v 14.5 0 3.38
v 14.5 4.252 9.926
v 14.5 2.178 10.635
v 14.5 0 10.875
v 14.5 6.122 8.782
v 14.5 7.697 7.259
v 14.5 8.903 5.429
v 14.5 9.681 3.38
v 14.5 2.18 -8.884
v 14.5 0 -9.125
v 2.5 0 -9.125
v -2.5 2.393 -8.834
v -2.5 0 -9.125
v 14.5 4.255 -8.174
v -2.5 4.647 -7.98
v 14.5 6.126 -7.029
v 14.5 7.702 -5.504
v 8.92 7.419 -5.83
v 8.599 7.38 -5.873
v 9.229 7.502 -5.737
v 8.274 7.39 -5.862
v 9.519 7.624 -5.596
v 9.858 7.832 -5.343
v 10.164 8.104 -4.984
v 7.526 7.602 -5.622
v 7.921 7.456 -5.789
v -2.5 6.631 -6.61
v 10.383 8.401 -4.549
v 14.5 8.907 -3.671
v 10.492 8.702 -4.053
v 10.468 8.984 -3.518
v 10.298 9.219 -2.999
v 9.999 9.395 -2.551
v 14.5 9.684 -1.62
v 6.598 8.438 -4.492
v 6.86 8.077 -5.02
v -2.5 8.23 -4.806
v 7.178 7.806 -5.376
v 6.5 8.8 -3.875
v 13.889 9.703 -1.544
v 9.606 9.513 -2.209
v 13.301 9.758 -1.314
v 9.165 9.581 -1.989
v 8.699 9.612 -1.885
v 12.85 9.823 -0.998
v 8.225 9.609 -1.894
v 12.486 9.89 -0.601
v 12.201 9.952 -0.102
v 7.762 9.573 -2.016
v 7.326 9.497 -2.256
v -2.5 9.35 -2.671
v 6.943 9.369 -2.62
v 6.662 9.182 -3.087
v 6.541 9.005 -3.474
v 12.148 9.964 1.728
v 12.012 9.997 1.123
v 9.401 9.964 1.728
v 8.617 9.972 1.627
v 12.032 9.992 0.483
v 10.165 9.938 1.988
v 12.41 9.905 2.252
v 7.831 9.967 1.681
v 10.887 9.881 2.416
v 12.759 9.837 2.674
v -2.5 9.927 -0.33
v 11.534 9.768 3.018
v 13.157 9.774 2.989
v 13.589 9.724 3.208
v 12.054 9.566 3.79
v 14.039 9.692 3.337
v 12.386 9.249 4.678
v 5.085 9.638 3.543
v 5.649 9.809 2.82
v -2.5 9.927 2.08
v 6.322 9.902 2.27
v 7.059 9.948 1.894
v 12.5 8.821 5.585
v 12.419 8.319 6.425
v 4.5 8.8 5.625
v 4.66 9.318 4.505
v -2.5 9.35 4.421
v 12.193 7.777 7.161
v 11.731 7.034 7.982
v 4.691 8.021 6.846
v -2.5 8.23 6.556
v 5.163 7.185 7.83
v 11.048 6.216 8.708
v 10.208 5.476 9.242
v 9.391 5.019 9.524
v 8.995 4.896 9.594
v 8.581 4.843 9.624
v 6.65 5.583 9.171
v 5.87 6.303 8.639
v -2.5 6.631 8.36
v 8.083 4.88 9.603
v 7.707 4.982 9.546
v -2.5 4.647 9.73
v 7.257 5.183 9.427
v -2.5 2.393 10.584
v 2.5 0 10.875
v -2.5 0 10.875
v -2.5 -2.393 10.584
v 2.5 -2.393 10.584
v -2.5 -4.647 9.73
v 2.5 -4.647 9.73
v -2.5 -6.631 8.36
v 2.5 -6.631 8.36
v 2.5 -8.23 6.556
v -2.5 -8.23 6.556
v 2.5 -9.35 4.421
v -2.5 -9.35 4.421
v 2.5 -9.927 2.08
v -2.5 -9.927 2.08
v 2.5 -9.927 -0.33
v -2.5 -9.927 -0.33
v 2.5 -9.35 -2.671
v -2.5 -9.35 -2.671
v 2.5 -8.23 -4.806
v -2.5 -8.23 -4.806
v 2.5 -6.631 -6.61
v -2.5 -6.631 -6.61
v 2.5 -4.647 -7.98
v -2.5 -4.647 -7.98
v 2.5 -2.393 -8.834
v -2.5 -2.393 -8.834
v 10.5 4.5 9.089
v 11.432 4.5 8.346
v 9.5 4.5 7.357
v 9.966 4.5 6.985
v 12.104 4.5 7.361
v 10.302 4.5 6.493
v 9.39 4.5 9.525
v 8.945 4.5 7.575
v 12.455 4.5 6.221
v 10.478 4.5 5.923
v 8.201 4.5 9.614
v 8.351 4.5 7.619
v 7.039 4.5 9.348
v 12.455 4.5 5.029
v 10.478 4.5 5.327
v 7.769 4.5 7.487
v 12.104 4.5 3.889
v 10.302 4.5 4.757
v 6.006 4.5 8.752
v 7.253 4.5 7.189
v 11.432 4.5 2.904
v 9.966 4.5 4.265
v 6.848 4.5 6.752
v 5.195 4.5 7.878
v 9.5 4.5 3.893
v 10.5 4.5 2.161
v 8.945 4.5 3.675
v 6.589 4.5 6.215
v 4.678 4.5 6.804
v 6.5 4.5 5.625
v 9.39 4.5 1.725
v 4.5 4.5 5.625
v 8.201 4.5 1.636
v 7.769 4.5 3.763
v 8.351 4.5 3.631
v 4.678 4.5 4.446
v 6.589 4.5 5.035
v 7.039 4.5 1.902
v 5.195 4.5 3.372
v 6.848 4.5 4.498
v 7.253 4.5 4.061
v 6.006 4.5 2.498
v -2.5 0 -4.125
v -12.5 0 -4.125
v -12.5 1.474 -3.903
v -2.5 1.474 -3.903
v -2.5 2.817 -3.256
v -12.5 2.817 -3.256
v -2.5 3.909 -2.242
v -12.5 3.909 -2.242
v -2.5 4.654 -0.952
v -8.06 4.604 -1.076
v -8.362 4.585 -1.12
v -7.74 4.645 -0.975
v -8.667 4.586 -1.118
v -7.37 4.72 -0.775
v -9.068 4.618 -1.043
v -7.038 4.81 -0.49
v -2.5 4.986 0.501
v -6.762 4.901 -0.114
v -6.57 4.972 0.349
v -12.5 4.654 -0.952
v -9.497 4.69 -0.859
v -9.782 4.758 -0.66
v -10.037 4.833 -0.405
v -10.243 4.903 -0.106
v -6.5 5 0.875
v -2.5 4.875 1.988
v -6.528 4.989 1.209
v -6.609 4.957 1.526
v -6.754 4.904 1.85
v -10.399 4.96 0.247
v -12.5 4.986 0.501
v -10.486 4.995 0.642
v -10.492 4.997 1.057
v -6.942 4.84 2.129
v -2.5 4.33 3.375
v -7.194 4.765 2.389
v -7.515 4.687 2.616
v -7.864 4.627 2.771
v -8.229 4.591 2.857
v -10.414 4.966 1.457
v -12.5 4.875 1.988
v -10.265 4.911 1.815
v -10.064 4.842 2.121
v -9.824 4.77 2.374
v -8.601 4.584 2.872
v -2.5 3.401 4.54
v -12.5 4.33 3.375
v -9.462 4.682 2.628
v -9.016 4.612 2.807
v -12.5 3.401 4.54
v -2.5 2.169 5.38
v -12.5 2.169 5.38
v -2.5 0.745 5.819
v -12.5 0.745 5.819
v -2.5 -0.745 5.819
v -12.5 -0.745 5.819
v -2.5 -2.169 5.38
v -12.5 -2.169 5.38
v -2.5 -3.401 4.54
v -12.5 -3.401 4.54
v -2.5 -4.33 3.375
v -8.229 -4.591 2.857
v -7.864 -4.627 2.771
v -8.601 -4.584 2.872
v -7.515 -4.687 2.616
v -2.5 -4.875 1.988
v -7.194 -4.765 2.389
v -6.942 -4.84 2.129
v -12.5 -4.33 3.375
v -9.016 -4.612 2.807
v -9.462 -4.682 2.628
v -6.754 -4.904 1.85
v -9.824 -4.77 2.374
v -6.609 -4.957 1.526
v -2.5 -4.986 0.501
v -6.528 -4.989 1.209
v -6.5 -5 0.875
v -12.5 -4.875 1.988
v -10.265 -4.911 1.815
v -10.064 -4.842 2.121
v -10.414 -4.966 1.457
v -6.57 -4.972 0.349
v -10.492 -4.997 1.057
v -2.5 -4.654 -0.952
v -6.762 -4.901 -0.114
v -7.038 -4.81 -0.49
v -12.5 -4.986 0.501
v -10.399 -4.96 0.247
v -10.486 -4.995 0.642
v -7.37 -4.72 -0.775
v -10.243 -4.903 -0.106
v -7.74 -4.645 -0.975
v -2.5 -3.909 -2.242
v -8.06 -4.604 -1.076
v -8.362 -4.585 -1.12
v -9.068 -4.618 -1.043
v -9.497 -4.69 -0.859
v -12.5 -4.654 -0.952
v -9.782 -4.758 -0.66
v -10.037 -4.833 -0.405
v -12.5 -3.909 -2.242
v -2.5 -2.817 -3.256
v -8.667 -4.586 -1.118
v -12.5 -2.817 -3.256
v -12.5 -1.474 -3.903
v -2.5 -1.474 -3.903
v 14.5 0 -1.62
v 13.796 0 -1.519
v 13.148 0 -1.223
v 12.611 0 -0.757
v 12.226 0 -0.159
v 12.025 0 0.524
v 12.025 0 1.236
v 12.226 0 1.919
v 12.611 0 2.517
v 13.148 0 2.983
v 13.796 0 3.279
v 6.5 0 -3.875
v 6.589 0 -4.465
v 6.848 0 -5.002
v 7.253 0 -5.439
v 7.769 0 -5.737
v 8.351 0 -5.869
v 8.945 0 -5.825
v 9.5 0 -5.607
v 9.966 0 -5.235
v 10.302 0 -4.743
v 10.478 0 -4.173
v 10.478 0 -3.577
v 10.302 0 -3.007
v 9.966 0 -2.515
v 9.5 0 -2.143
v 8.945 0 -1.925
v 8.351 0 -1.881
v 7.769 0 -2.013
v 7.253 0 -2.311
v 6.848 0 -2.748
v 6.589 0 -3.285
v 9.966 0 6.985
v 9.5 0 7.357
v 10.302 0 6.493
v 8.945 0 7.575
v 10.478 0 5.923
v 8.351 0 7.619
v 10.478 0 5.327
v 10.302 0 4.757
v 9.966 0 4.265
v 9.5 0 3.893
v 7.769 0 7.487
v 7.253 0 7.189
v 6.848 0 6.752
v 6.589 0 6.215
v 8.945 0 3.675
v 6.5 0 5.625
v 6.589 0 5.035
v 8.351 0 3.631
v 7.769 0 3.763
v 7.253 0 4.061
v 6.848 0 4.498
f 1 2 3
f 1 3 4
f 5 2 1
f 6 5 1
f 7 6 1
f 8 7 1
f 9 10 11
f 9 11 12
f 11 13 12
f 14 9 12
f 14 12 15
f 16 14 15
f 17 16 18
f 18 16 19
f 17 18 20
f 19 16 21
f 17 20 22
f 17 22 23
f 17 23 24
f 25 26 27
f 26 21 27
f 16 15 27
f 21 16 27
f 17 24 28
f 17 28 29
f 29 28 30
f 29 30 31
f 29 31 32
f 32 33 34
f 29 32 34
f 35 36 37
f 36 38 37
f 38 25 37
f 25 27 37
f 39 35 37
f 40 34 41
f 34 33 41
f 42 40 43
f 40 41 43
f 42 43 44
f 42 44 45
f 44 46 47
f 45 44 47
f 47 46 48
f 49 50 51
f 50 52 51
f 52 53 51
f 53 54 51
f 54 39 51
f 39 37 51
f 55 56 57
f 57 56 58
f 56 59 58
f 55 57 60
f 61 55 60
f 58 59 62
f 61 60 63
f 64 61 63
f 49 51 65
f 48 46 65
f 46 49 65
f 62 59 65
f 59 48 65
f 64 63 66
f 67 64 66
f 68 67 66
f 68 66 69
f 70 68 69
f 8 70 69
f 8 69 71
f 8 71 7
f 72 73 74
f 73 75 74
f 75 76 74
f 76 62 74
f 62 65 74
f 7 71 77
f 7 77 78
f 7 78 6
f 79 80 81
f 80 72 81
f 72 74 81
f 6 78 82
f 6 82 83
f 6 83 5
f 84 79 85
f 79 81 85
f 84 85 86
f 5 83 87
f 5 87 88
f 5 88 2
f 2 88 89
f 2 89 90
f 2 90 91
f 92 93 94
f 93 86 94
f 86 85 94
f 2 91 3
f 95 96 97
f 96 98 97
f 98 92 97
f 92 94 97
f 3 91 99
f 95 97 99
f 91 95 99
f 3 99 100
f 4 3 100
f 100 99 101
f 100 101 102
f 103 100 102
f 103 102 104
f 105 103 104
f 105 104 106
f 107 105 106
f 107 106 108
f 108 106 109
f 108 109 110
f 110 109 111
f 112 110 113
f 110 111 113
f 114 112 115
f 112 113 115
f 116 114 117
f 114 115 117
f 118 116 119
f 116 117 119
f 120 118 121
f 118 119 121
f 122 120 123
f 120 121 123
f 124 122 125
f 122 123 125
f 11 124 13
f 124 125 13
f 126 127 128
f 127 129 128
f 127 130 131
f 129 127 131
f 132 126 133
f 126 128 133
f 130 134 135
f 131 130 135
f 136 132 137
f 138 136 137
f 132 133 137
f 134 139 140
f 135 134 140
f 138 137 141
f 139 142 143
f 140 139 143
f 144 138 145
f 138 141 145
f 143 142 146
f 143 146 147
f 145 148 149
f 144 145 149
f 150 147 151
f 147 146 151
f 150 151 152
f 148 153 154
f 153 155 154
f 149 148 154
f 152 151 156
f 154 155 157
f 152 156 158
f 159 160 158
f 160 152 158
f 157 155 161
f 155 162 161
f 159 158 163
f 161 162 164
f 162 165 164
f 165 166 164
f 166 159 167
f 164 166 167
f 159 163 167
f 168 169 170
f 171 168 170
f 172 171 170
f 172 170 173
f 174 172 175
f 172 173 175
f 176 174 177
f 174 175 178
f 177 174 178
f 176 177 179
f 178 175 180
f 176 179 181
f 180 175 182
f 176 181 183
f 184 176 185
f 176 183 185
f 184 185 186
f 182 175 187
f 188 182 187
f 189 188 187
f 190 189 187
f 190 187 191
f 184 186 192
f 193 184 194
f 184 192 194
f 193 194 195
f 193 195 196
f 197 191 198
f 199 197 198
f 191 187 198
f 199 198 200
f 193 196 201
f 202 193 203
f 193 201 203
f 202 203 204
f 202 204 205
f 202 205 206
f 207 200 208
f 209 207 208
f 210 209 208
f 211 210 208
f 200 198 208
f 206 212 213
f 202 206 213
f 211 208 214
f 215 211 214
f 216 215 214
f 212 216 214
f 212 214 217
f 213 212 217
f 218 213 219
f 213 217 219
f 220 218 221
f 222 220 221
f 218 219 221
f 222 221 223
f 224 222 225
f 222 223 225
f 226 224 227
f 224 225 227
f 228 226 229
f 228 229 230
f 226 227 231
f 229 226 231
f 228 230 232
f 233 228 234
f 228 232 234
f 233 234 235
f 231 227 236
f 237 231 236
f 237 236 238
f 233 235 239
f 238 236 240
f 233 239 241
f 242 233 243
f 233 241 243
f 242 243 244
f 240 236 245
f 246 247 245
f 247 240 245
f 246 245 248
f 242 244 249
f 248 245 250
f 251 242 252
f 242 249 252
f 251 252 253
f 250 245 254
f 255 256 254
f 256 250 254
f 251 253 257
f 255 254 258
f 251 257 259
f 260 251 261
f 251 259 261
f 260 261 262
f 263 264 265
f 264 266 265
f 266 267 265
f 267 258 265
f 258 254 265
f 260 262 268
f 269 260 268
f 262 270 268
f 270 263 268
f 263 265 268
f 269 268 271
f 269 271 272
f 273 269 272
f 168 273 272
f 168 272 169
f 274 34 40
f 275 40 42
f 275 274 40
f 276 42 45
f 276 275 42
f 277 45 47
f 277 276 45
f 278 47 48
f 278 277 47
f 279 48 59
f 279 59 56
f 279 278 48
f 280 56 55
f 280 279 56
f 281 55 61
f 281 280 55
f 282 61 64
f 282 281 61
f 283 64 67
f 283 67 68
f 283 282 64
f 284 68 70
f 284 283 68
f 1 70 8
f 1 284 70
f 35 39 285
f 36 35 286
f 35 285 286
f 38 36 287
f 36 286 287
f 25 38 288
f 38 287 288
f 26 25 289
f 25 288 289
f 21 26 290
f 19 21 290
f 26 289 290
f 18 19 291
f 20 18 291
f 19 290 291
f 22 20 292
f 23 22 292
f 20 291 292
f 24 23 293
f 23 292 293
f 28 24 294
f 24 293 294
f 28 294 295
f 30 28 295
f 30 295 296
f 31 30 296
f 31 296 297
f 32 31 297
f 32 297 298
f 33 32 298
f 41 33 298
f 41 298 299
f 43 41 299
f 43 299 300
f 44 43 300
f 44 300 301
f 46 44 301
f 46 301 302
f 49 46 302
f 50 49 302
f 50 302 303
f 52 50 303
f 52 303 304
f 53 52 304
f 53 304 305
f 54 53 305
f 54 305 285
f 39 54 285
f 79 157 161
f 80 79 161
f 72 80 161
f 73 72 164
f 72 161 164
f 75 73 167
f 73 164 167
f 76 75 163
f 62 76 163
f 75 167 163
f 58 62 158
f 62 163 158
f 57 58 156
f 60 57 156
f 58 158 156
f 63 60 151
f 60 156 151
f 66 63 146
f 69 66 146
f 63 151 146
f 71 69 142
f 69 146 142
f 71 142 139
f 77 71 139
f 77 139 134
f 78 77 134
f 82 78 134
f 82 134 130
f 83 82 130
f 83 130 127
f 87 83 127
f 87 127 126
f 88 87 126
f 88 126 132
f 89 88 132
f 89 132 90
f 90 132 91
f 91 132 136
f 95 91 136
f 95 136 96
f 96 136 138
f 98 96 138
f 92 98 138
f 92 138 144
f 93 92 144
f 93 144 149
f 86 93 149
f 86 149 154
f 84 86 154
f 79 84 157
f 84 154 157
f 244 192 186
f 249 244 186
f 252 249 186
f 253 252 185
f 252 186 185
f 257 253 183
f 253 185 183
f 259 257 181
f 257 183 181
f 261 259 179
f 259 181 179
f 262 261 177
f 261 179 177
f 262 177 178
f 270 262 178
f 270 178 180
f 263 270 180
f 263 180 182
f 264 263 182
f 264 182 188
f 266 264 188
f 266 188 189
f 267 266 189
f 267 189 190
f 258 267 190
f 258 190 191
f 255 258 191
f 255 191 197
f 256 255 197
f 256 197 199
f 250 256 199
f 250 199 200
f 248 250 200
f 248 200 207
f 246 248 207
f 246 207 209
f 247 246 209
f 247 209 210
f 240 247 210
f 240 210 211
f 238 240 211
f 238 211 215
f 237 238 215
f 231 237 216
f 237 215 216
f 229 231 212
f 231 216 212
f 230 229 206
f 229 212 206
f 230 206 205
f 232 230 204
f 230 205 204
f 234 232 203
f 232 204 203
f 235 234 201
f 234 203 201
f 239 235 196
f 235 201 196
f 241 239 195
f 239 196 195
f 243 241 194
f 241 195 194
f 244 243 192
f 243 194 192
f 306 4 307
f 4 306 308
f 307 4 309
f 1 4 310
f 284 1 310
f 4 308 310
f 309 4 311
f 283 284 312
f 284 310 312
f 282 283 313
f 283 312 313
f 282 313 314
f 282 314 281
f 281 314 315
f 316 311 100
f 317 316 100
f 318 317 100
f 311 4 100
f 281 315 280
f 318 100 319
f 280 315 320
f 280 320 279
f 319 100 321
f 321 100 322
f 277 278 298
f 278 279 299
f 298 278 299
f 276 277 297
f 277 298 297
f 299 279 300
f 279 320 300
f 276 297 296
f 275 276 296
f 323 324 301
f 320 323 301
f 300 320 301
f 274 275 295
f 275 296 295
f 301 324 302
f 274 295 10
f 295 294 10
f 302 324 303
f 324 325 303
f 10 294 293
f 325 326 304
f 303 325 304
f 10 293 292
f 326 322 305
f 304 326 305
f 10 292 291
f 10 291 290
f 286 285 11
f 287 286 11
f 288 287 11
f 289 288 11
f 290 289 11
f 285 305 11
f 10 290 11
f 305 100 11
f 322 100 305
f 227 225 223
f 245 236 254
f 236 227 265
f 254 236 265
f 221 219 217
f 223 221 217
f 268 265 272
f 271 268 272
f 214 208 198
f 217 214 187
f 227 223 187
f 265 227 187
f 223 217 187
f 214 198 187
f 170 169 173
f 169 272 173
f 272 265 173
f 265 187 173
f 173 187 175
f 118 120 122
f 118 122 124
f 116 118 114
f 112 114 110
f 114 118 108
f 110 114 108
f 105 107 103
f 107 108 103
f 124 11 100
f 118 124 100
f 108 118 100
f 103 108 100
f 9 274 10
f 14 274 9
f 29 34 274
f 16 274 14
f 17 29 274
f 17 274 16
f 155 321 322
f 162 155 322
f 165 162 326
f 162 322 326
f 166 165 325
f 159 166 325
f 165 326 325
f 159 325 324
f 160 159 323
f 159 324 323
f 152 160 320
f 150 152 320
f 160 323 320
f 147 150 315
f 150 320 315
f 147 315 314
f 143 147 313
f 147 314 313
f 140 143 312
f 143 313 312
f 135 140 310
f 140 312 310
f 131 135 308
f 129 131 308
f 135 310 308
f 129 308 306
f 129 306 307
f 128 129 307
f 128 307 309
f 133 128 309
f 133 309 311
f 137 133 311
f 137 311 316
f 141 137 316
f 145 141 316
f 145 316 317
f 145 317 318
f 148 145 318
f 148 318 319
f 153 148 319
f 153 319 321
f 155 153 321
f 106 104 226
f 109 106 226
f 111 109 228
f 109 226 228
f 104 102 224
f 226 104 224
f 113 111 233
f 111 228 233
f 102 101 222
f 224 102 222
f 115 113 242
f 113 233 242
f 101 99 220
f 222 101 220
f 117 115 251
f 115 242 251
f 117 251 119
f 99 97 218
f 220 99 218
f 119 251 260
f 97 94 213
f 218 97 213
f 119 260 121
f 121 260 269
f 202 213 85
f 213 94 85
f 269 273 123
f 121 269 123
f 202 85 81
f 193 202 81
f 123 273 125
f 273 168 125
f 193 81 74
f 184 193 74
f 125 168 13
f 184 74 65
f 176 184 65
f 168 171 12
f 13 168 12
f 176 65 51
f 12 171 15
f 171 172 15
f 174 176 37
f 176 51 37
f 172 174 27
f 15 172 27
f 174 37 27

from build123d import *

# Parameters (mm, degrees)
DODANIE_WYCI_GNI_CIE1_DEPTH = 12
SZKIC3_R                    = 2
WYTNIJ_WYCI_GNI_CIE1_DEPTH  = 12
SZKIC5_R                    = 4
WYTNIJ_WYCI_GNI_CIE4_DEPTH  = 10
SZKIC12_R                   = 2.5
WYTNIJ_WYCI_GNI_CIE8_DEPTH  = 11.0000001
SZKIC13_R                   = 2
WYTNIJ_WYCI_GNI_CIE9_DEPTH  = 25.5000001


with BuildPart() as part:
    # Szkic1 → Obrót1 (revolve)
    with BuildSketch(Plane(origin=(0, 0, 0), x_dir=(1, 0, 0), z_dir=(0, 1, 0))):
        Polygon((2.5, -0.875), (2.5, 9.125), (-2.5, 9.125), (-2.5, 4.125), (-12.5, 4.125), (-12.5, -0.875), align=None)
    revolve(axis=Axis((-12.5, 0, 0.875), (1, 0, 0)))

    # Szkic2 → Dodanie-wyciągnięcie1 (add)
    with BuildSketch(Plane(origin=(2.5, 0, 0), x_dir=(0, 0, -1), z_dir=(1, 0, 0))):
        with BuildLine():
            Line((-10.875, 0), (9.125, 0))
            ThreePointArc((9.125, 0), (-0.875, 10), (-10.875, 0))
        make_face()
    extrude(amount=DODANIE_WYCI_GNI_CIE1_DEPTH)

    # Szkic3 → Wytnij-wyciągnięcie1 (cut)
    with BuildSketch(Plane(origin=(0, 0, 0), x_dir=(-1, 0, 0), z_dir=(0, -1, 0))):
        with Locations((-8.5, -5.625)):
            Circle(SZKIC3_R)
        with Locations((-8.5, 3.875)):
            Circle(SZKIC3_R)
    extrude(amount=-WYTNIJ_WYCI_GNI_CIE1_DEPTH, mode=Mode.SUBTRACT)

    # Szkic5 → Wytnij-wyciągnięcie4 (cut)
    with BuildSketch(Plane(origin=(0, 4.5, 0), x_dir=(-1, 0, 0), z_dir=(0, -1, 0))):
        with Locations((-8.5, -5.625)):
            Circle(SZKIC5_R)
    extrude(amount=-WYTNIJ_WYCI_GNI_CIE4_DEPTH, mode=Mode.SUBTRACT)

    # Szkic12 → Wytnij-wyciągnięcie8 (cut, through all)
    with BuildSketch(Plane(origin=(0, 0, 0), x_dir=(1, 0, 0), z_dir=(0, 1, 0))):
        with Locations((14.5, -0.88)):
            Circle(SZKIC12_R)
    extrude(amount=WYTNIJ_WYCI_GNI_CIE8_DEPTH, mode=Mode.SUBTRACT)

    # Szkic13 → Wytnij-wyciągnięcie9 (cut, through all)
    with BuildSketch(Plane(origin=(0, 14.5, 0), x_dir=(1, 0, 0), z_dir=(0, 1, 0))):
        with Locations((-8.5, -0.875)):
            Circle(SZKIC13_R)
    extrude(amount=-WYTNIJ_WYCI_GNI_CIE9_DEPTH, mode=Mode.SUBTRACT)


solid = part.part
